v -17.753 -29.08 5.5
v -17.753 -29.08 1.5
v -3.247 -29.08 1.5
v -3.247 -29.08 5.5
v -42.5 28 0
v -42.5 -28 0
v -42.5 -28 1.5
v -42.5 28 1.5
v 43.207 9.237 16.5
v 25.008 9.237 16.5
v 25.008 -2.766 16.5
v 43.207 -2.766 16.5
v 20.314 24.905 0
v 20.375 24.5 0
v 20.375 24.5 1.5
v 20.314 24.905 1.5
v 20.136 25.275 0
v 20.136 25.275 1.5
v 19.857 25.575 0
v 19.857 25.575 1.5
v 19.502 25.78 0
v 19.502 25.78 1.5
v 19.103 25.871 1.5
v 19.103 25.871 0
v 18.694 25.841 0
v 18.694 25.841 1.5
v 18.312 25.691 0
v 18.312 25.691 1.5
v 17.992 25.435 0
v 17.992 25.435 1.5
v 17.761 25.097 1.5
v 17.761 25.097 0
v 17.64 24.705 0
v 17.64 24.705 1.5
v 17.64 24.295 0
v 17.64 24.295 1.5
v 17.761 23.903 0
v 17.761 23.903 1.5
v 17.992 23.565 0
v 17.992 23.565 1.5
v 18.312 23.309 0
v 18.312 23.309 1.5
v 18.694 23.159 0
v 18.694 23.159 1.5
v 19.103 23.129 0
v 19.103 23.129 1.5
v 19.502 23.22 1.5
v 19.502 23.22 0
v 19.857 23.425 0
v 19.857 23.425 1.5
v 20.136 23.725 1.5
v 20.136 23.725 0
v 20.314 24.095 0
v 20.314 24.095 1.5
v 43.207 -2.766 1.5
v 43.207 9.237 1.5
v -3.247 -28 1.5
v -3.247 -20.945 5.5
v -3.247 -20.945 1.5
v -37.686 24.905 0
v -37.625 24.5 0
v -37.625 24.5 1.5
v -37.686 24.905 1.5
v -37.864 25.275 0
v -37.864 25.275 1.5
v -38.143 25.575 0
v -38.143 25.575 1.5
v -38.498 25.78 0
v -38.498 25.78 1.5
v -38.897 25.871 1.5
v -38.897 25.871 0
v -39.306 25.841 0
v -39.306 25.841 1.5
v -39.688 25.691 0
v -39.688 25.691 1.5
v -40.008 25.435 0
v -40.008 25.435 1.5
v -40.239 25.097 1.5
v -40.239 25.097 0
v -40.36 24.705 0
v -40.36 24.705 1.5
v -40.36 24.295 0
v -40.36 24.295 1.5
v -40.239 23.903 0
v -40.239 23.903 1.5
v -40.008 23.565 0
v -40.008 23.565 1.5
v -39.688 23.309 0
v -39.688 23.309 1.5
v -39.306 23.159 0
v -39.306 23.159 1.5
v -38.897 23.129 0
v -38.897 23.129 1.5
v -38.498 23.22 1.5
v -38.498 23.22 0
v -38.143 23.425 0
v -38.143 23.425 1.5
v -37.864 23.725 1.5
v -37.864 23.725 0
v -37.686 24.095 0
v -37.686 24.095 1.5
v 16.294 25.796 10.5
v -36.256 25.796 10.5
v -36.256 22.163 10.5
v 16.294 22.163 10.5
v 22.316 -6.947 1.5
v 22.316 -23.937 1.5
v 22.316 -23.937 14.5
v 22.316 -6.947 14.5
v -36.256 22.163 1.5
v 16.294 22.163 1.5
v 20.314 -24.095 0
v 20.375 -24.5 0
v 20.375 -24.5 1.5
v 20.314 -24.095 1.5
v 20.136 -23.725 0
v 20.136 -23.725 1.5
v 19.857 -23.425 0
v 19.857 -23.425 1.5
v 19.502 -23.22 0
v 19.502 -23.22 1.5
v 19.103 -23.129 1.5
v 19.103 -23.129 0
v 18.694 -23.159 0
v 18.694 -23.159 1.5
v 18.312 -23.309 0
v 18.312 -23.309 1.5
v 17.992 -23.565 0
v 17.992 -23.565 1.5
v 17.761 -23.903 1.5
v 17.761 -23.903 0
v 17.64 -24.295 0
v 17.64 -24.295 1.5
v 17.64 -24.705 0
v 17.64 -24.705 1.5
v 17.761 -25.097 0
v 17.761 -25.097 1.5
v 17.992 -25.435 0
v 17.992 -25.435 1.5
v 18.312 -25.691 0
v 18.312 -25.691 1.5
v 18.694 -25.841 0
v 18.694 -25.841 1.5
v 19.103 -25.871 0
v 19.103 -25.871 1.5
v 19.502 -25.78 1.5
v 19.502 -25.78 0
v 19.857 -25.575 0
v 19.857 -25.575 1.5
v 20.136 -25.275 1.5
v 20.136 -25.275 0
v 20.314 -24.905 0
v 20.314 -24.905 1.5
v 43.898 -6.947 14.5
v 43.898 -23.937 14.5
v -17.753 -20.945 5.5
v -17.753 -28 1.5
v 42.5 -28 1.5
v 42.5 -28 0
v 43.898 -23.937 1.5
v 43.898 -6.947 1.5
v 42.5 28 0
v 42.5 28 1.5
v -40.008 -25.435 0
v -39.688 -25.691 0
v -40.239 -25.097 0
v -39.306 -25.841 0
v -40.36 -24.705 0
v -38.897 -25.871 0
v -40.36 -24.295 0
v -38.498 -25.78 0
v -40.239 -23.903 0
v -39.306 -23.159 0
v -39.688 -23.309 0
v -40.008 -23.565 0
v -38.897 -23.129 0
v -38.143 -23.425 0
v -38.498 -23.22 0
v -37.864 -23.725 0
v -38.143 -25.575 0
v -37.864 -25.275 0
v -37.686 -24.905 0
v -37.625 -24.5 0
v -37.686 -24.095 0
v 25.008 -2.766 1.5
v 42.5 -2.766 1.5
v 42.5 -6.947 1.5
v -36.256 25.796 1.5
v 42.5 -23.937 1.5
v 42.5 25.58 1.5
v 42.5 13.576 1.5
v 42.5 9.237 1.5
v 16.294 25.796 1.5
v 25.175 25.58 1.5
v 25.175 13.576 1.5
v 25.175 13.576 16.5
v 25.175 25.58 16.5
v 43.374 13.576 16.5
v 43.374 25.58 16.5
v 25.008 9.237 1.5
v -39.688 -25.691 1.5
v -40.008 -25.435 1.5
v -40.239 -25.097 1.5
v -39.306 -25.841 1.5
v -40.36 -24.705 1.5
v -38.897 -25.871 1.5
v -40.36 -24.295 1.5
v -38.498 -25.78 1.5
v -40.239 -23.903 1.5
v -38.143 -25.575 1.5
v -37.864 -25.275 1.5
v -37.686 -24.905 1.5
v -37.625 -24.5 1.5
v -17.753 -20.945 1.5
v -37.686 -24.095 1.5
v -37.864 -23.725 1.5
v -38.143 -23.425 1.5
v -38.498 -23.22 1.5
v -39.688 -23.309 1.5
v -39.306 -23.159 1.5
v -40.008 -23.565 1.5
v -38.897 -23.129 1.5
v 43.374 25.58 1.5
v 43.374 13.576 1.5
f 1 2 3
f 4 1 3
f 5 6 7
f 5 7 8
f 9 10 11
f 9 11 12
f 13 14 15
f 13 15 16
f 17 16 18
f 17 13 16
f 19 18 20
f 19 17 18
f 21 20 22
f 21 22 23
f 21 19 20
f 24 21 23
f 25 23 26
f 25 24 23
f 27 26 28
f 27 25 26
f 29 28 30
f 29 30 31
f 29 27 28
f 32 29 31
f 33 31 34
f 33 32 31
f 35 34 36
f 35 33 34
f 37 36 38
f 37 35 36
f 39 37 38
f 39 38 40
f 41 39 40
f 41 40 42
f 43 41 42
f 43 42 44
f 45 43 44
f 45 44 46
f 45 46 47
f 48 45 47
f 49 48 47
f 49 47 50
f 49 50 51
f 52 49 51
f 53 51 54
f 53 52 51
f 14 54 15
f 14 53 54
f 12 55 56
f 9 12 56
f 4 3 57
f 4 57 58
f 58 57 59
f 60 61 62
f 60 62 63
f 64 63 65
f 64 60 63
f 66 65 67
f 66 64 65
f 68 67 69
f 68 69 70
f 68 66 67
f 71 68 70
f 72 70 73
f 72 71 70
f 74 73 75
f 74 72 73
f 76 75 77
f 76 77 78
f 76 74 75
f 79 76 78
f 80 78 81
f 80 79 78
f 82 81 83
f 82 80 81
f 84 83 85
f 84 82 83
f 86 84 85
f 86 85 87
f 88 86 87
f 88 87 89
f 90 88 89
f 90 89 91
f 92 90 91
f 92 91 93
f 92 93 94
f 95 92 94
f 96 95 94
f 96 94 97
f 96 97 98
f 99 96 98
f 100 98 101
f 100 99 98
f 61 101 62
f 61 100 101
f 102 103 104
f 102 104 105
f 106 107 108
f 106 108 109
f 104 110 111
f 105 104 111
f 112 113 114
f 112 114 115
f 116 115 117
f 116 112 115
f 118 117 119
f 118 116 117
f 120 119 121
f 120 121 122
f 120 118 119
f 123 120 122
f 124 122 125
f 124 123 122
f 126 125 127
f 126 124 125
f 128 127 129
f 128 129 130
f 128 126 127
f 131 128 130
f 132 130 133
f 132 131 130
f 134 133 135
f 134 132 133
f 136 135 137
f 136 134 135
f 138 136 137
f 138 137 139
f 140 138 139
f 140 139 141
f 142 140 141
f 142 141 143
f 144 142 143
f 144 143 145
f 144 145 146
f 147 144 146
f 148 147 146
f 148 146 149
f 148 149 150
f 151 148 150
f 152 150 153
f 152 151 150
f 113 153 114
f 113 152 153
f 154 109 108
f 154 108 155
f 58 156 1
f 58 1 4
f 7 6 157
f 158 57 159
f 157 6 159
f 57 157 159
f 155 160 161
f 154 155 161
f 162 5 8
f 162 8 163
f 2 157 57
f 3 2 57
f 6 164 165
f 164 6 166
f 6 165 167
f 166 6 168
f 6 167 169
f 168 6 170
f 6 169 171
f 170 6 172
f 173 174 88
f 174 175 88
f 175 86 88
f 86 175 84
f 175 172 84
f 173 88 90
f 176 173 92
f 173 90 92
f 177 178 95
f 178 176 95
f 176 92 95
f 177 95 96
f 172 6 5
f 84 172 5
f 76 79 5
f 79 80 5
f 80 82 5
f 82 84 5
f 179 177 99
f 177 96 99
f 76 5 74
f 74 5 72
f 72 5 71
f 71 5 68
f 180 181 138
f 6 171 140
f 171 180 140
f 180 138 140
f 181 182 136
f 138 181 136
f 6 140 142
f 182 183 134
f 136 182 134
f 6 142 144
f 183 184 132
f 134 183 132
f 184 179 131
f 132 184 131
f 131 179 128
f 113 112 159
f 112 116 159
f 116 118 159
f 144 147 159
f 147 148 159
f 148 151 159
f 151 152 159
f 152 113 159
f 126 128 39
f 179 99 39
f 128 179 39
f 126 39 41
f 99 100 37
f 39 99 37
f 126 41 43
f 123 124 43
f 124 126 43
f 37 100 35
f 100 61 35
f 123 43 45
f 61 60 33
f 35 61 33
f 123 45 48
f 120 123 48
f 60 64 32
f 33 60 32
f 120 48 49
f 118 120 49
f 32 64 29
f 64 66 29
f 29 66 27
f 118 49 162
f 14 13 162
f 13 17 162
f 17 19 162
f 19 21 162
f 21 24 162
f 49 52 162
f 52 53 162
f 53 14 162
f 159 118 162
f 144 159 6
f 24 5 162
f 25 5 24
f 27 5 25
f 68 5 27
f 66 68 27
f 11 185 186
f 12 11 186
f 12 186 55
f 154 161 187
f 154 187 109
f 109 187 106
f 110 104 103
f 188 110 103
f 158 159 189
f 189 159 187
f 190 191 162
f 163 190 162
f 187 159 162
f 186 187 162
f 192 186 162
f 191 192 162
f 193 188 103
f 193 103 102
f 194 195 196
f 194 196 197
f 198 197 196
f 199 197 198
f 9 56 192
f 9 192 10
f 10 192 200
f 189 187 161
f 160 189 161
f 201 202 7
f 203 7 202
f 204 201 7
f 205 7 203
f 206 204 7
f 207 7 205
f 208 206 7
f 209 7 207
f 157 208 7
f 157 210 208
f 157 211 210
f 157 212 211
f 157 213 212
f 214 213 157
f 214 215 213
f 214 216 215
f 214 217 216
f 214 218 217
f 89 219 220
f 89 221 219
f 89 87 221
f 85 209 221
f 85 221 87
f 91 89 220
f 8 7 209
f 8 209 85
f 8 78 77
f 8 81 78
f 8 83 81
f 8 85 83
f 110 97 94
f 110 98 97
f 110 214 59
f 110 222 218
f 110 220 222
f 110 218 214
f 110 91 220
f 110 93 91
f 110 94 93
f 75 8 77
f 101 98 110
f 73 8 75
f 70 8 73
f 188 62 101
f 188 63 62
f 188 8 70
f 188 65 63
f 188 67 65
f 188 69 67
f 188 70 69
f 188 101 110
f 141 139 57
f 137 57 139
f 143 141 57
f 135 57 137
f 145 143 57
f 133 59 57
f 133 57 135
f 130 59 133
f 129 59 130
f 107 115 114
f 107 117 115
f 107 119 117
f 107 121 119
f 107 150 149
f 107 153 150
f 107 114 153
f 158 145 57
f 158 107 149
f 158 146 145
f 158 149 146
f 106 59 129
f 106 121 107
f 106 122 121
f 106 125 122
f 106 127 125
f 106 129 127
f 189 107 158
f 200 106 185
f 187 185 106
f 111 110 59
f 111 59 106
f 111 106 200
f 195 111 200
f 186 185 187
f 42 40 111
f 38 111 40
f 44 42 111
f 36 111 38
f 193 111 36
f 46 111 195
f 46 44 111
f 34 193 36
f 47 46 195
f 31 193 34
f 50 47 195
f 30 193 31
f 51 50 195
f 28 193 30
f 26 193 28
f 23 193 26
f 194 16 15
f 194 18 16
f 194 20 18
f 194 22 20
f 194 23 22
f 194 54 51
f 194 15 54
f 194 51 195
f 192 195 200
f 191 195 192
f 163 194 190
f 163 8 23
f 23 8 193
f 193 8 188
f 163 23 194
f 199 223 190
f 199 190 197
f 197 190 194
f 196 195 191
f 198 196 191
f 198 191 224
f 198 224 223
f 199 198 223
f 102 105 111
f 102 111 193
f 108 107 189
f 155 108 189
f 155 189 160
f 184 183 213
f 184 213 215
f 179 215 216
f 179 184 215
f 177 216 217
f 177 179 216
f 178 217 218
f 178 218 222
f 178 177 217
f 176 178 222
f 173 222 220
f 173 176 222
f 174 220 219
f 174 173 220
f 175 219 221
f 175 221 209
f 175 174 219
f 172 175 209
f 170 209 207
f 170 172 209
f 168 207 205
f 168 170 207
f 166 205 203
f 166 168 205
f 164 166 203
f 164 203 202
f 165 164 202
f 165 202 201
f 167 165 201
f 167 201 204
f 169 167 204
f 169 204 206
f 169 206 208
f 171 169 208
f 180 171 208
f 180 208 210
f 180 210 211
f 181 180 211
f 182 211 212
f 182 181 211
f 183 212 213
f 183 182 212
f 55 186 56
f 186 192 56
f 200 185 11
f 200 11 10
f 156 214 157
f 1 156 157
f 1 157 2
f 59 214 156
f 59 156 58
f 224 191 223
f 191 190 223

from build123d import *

# Parameters (mm, degrees)
F0_W     = 85
F0_H     = 56
F0_R     = 1.375
F1_DEPTH = 1.5
F2_W     = 14.5066131875
F2_H     = 7.0550842881
F2_H_2   = 1.0795340971
F3_DEPTH = 4
F2_W_2   = 52.5494457505
F2_H_3   = 3.6331438509
F4_DEPTH = 9
F2_W_3   = 0.706913475
F2_H_4   = 12.0032178172
F2_W_4   = 17.4915134945
F2_W_5   = 0.87367237
F2_W_6   = 17.3247545996
F5_DEPTH = 15
F2_W_7   = 20.1837714718
F2_H_5   = 16.9899400229
F2_W_8   = 1.3980423616
F6_DEPTH = 13


with BuildPart() as f1:
    # F0 (on Top) → F1 (new body)
    with BuildSketch(Plane.XY):
        Rectangle(F0_W, F0_H)
        with Locations((-39, -24.5)):
            Circle(F0_R, mode=Mode.SUBTRACT)
        with Locations((19, -24.5)):
            Circle(F0_R, mode=Mode.SUBTRACT)
        with Locations((-39, 24.5)):
            Circle(F0_R, mode=Mode.SUBTRACT)
        with Locations((19, 24.5)):
            Circle(F0_R, mode=Mode.SUBTRACT)
    extrude(amount=F1_DEPTH)

    # F2 (on face) → F3 (join)
    with BuildSketch(Plane.XY.offset(1.5)):
        with Locations((-10.5, -24.4724578559)):
            Rectangle(F2_W, F2_H)
        with Locations((-10.5, -28.5397670486)):
            Rectangle(F2_W, F2_H_2)
    extrude(amount=F3_DEPTH)

    # F2 (on face) → F4 (join)
    with BuildSketch(Plane.XY.offset(1.5)):
        with Locations((-9.9811840151, 23.979865989)):
            Rectangle(F2_W_2, F2_H_3)
    extrude(amount=F4_DEPTH)

    # F2 (on face) → F5 (join)
    with BuildSketch(Plane.XY.offset(1.5)):
        with Locations((42.8534567375, 3.2353831921)):
            Rectangle(F2_W_3, F2_H_4)
        with Locations((33.7542432528, 3.2353831921)):
            Rectangle(F2_W_4, F2_H_4)
        with Locations((42.936836185, 19.5779297501)):
            Rectangle(F2_W_5, F2_H_4)
        with Locations((33.8376227002, 19.5779297501)):
            Rectangle(F2_W_6, F2_H_4)
    extrude(amount=F5_DEPTH)

    # F2 (on face) → F6 (join)
    with BuildSketch(Plane.XY.offset(1.5)):
        with Locations((32.4081142641, -15.4418135062)):
            Rectangle(F2_W_7, F2_H_5)
        with Locations((43.1990211808, -15.4418135062)):
            Rectangle(F2_W_8, F2_H_5)
    extrude(amount=F6_DEPTH)


solid = f1.part
